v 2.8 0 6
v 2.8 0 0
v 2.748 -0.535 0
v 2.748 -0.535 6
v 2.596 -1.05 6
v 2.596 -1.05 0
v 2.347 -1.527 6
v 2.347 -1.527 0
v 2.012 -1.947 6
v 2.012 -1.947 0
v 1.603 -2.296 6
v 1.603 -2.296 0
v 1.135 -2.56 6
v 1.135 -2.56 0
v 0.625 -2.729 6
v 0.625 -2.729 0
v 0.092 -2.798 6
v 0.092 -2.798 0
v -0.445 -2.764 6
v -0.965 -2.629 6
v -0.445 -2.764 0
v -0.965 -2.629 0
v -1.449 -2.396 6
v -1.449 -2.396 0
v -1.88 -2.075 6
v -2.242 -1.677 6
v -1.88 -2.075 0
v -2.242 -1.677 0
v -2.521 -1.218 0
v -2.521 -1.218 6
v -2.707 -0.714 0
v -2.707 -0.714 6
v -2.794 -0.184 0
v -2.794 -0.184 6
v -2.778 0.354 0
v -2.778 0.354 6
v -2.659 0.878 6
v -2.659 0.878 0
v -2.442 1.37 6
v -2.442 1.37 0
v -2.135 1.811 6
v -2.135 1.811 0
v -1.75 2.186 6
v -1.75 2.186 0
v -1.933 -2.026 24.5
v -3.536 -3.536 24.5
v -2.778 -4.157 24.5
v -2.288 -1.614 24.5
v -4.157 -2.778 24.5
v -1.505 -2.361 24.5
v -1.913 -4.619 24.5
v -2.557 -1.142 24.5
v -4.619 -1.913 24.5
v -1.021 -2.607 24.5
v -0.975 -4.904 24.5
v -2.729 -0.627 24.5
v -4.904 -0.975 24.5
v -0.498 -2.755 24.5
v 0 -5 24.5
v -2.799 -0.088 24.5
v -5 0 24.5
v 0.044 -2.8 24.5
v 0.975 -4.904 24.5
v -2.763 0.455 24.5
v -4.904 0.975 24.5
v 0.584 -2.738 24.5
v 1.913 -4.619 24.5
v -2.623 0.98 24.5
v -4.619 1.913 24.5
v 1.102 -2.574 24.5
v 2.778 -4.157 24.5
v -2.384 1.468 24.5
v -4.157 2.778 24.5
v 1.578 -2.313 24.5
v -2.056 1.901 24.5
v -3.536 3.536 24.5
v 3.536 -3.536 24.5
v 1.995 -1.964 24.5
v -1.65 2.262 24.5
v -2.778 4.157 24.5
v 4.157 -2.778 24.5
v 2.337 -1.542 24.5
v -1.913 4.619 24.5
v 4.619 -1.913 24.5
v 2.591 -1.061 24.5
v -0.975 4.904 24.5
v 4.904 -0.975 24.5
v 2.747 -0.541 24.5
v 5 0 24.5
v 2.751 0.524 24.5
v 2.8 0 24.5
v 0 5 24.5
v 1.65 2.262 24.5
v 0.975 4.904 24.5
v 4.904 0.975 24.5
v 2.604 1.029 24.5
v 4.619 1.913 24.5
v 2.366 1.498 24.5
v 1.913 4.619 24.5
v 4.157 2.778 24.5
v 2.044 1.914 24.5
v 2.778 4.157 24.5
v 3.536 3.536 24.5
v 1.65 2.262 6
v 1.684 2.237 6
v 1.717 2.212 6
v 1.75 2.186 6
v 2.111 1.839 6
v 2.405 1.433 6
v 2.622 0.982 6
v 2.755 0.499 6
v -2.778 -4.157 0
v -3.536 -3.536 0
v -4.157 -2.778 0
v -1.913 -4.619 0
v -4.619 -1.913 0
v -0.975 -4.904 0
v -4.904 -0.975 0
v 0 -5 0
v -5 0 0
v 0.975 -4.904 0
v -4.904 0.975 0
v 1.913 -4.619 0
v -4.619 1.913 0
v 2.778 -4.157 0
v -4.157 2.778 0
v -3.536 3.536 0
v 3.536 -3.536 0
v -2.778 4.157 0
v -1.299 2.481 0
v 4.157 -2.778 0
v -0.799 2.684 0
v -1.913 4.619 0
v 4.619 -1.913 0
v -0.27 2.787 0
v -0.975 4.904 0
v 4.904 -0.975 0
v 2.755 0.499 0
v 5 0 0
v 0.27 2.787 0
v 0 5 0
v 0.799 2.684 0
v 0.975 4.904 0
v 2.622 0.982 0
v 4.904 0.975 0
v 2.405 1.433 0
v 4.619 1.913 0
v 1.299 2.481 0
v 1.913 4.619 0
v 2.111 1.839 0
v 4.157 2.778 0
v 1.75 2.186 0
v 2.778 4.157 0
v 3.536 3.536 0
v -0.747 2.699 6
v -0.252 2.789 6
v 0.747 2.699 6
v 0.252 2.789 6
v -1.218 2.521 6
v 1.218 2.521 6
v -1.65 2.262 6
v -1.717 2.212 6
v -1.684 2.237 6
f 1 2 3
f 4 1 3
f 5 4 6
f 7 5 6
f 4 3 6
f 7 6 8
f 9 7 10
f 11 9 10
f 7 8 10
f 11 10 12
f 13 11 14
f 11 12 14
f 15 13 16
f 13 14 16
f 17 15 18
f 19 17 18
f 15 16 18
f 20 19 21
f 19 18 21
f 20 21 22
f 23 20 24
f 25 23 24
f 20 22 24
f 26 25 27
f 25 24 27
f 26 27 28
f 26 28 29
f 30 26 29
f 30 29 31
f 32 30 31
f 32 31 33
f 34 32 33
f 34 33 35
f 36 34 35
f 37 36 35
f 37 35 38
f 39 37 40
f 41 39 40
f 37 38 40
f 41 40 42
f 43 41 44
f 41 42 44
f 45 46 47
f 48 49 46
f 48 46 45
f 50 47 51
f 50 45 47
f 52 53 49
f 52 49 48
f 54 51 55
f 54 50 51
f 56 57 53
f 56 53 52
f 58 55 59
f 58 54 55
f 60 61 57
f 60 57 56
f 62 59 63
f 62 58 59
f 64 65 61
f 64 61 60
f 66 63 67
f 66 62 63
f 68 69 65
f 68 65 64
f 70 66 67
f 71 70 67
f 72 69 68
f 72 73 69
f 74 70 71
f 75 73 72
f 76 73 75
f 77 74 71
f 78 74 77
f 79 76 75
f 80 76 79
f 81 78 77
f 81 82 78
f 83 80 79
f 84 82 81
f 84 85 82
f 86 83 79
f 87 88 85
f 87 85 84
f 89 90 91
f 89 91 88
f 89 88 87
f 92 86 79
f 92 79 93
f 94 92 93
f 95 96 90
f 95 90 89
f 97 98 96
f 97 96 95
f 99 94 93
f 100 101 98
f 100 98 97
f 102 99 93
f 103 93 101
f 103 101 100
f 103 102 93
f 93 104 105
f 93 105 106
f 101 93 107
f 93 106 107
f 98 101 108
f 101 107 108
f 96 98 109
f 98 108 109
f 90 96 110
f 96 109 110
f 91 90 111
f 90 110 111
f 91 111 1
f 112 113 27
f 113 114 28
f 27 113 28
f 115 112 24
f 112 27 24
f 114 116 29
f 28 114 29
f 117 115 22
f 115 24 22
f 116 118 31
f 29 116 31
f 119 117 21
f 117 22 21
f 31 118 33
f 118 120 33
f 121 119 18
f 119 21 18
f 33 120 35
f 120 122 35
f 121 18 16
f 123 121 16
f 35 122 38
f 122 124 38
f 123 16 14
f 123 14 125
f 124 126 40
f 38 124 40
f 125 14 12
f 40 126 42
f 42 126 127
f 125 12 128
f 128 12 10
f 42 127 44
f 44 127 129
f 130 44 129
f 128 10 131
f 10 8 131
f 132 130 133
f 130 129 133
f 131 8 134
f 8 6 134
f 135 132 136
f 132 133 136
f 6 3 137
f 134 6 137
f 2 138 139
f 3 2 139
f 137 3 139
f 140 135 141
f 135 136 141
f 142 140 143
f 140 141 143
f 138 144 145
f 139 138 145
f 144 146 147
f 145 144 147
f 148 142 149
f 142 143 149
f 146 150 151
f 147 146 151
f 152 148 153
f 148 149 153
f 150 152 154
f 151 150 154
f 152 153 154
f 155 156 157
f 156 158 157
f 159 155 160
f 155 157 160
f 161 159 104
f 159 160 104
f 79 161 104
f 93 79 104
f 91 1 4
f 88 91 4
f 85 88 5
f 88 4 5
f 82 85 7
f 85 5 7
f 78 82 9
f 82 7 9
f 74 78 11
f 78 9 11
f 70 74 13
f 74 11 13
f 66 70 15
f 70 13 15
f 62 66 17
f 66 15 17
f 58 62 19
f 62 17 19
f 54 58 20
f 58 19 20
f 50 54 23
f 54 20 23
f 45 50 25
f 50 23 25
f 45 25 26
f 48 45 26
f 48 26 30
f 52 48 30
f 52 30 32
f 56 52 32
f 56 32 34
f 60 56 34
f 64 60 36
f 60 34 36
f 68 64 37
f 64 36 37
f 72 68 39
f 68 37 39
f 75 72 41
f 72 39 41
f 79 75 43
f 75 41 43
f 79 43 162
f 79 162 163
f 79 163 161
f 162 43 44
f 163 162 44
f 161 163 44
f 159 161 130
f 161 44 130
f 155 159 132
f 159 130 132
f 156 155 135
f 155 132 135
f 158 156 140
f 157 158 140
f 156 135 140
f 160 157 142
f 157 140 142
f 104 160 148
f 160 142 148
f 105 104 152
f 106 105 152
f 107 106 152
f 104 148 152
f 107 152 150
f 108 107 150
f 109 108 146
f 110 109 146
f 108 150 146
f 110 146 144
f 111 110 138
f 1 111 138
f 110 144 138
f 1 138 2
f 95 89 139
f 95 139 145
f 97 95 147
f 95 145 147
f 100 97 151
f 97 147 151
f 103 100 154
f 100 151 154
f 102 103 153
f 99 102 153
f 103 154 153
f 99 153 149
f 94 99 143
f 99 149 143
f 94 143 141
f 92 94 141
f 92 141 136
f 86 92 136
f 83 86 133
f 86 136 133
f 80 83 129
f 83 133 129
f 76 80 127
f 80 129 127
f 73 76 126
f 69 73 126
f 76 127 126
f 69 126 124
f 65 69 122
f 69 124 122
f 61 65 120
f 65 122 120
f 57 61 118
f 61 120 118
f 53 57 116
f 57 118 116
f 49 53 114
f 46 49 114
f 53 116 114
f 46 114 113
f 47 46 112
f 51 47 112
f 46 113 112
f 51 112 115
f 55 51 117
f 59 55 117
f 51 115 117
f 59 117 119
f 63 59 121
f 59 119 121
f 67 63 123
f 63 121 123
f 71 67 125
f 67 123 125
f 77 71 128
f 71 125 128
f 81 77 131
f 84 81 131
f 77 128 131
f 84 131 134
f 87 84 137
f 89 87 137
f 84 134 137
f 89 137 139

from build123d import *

# Parameters (mm, degrees)
F0_R     = 5
F1_DEPTH = 6
F2_R     = 5
F3_DEPTH = 18.5


with BuildPart() as f1:
    # F0 (on Top) → F1 (new body)
    with BuildSketch(Plane.XY):
        Circle(F0_R)
        with BuildLine():
            ThreePointArc((1.75, 2.185749), (2.523886, 1.212436), (2.8, 0))
            ThreePointArc((2.8, 0), (-1.212436, -2.523886), (-1.75, 2.185749))
            ThreePointArc((-1.75, 2.185749), (0, 2.8), (1.75, 2.185749))
        make_face(mode=Mode.SUBTRACT)
    extrude(amount=F1_DEPTH)

    # F2 (on face) → F3 (join)
    with BuildSketch(Plane.XY.offset(6)):
        Circle(F2_R)
        with BuildLine():
            ThreePointArc((2.8, 0), (-1.268858, -2.495997), (-1.65, 2.262189))
            ThreePointArc((-1.65, 2.262189), (0, 2.8), (1.65, 2.262189))
            ThreePointArc((1.65, 2.262189), (2.495997, 1.268858), (2.8, 0))
        make_face(mode=Mode.SUBTRACT)
        with BuildLine():
            ThreePointArc((1.65, 2.262189), (0, 2.8), (-1.65, 2.262189))
            Line((-1.65, 2.262189), (1.65, 2.262189))
        make_face()
    extrude(amount=F3_DEPTH)


solid = f1.part
